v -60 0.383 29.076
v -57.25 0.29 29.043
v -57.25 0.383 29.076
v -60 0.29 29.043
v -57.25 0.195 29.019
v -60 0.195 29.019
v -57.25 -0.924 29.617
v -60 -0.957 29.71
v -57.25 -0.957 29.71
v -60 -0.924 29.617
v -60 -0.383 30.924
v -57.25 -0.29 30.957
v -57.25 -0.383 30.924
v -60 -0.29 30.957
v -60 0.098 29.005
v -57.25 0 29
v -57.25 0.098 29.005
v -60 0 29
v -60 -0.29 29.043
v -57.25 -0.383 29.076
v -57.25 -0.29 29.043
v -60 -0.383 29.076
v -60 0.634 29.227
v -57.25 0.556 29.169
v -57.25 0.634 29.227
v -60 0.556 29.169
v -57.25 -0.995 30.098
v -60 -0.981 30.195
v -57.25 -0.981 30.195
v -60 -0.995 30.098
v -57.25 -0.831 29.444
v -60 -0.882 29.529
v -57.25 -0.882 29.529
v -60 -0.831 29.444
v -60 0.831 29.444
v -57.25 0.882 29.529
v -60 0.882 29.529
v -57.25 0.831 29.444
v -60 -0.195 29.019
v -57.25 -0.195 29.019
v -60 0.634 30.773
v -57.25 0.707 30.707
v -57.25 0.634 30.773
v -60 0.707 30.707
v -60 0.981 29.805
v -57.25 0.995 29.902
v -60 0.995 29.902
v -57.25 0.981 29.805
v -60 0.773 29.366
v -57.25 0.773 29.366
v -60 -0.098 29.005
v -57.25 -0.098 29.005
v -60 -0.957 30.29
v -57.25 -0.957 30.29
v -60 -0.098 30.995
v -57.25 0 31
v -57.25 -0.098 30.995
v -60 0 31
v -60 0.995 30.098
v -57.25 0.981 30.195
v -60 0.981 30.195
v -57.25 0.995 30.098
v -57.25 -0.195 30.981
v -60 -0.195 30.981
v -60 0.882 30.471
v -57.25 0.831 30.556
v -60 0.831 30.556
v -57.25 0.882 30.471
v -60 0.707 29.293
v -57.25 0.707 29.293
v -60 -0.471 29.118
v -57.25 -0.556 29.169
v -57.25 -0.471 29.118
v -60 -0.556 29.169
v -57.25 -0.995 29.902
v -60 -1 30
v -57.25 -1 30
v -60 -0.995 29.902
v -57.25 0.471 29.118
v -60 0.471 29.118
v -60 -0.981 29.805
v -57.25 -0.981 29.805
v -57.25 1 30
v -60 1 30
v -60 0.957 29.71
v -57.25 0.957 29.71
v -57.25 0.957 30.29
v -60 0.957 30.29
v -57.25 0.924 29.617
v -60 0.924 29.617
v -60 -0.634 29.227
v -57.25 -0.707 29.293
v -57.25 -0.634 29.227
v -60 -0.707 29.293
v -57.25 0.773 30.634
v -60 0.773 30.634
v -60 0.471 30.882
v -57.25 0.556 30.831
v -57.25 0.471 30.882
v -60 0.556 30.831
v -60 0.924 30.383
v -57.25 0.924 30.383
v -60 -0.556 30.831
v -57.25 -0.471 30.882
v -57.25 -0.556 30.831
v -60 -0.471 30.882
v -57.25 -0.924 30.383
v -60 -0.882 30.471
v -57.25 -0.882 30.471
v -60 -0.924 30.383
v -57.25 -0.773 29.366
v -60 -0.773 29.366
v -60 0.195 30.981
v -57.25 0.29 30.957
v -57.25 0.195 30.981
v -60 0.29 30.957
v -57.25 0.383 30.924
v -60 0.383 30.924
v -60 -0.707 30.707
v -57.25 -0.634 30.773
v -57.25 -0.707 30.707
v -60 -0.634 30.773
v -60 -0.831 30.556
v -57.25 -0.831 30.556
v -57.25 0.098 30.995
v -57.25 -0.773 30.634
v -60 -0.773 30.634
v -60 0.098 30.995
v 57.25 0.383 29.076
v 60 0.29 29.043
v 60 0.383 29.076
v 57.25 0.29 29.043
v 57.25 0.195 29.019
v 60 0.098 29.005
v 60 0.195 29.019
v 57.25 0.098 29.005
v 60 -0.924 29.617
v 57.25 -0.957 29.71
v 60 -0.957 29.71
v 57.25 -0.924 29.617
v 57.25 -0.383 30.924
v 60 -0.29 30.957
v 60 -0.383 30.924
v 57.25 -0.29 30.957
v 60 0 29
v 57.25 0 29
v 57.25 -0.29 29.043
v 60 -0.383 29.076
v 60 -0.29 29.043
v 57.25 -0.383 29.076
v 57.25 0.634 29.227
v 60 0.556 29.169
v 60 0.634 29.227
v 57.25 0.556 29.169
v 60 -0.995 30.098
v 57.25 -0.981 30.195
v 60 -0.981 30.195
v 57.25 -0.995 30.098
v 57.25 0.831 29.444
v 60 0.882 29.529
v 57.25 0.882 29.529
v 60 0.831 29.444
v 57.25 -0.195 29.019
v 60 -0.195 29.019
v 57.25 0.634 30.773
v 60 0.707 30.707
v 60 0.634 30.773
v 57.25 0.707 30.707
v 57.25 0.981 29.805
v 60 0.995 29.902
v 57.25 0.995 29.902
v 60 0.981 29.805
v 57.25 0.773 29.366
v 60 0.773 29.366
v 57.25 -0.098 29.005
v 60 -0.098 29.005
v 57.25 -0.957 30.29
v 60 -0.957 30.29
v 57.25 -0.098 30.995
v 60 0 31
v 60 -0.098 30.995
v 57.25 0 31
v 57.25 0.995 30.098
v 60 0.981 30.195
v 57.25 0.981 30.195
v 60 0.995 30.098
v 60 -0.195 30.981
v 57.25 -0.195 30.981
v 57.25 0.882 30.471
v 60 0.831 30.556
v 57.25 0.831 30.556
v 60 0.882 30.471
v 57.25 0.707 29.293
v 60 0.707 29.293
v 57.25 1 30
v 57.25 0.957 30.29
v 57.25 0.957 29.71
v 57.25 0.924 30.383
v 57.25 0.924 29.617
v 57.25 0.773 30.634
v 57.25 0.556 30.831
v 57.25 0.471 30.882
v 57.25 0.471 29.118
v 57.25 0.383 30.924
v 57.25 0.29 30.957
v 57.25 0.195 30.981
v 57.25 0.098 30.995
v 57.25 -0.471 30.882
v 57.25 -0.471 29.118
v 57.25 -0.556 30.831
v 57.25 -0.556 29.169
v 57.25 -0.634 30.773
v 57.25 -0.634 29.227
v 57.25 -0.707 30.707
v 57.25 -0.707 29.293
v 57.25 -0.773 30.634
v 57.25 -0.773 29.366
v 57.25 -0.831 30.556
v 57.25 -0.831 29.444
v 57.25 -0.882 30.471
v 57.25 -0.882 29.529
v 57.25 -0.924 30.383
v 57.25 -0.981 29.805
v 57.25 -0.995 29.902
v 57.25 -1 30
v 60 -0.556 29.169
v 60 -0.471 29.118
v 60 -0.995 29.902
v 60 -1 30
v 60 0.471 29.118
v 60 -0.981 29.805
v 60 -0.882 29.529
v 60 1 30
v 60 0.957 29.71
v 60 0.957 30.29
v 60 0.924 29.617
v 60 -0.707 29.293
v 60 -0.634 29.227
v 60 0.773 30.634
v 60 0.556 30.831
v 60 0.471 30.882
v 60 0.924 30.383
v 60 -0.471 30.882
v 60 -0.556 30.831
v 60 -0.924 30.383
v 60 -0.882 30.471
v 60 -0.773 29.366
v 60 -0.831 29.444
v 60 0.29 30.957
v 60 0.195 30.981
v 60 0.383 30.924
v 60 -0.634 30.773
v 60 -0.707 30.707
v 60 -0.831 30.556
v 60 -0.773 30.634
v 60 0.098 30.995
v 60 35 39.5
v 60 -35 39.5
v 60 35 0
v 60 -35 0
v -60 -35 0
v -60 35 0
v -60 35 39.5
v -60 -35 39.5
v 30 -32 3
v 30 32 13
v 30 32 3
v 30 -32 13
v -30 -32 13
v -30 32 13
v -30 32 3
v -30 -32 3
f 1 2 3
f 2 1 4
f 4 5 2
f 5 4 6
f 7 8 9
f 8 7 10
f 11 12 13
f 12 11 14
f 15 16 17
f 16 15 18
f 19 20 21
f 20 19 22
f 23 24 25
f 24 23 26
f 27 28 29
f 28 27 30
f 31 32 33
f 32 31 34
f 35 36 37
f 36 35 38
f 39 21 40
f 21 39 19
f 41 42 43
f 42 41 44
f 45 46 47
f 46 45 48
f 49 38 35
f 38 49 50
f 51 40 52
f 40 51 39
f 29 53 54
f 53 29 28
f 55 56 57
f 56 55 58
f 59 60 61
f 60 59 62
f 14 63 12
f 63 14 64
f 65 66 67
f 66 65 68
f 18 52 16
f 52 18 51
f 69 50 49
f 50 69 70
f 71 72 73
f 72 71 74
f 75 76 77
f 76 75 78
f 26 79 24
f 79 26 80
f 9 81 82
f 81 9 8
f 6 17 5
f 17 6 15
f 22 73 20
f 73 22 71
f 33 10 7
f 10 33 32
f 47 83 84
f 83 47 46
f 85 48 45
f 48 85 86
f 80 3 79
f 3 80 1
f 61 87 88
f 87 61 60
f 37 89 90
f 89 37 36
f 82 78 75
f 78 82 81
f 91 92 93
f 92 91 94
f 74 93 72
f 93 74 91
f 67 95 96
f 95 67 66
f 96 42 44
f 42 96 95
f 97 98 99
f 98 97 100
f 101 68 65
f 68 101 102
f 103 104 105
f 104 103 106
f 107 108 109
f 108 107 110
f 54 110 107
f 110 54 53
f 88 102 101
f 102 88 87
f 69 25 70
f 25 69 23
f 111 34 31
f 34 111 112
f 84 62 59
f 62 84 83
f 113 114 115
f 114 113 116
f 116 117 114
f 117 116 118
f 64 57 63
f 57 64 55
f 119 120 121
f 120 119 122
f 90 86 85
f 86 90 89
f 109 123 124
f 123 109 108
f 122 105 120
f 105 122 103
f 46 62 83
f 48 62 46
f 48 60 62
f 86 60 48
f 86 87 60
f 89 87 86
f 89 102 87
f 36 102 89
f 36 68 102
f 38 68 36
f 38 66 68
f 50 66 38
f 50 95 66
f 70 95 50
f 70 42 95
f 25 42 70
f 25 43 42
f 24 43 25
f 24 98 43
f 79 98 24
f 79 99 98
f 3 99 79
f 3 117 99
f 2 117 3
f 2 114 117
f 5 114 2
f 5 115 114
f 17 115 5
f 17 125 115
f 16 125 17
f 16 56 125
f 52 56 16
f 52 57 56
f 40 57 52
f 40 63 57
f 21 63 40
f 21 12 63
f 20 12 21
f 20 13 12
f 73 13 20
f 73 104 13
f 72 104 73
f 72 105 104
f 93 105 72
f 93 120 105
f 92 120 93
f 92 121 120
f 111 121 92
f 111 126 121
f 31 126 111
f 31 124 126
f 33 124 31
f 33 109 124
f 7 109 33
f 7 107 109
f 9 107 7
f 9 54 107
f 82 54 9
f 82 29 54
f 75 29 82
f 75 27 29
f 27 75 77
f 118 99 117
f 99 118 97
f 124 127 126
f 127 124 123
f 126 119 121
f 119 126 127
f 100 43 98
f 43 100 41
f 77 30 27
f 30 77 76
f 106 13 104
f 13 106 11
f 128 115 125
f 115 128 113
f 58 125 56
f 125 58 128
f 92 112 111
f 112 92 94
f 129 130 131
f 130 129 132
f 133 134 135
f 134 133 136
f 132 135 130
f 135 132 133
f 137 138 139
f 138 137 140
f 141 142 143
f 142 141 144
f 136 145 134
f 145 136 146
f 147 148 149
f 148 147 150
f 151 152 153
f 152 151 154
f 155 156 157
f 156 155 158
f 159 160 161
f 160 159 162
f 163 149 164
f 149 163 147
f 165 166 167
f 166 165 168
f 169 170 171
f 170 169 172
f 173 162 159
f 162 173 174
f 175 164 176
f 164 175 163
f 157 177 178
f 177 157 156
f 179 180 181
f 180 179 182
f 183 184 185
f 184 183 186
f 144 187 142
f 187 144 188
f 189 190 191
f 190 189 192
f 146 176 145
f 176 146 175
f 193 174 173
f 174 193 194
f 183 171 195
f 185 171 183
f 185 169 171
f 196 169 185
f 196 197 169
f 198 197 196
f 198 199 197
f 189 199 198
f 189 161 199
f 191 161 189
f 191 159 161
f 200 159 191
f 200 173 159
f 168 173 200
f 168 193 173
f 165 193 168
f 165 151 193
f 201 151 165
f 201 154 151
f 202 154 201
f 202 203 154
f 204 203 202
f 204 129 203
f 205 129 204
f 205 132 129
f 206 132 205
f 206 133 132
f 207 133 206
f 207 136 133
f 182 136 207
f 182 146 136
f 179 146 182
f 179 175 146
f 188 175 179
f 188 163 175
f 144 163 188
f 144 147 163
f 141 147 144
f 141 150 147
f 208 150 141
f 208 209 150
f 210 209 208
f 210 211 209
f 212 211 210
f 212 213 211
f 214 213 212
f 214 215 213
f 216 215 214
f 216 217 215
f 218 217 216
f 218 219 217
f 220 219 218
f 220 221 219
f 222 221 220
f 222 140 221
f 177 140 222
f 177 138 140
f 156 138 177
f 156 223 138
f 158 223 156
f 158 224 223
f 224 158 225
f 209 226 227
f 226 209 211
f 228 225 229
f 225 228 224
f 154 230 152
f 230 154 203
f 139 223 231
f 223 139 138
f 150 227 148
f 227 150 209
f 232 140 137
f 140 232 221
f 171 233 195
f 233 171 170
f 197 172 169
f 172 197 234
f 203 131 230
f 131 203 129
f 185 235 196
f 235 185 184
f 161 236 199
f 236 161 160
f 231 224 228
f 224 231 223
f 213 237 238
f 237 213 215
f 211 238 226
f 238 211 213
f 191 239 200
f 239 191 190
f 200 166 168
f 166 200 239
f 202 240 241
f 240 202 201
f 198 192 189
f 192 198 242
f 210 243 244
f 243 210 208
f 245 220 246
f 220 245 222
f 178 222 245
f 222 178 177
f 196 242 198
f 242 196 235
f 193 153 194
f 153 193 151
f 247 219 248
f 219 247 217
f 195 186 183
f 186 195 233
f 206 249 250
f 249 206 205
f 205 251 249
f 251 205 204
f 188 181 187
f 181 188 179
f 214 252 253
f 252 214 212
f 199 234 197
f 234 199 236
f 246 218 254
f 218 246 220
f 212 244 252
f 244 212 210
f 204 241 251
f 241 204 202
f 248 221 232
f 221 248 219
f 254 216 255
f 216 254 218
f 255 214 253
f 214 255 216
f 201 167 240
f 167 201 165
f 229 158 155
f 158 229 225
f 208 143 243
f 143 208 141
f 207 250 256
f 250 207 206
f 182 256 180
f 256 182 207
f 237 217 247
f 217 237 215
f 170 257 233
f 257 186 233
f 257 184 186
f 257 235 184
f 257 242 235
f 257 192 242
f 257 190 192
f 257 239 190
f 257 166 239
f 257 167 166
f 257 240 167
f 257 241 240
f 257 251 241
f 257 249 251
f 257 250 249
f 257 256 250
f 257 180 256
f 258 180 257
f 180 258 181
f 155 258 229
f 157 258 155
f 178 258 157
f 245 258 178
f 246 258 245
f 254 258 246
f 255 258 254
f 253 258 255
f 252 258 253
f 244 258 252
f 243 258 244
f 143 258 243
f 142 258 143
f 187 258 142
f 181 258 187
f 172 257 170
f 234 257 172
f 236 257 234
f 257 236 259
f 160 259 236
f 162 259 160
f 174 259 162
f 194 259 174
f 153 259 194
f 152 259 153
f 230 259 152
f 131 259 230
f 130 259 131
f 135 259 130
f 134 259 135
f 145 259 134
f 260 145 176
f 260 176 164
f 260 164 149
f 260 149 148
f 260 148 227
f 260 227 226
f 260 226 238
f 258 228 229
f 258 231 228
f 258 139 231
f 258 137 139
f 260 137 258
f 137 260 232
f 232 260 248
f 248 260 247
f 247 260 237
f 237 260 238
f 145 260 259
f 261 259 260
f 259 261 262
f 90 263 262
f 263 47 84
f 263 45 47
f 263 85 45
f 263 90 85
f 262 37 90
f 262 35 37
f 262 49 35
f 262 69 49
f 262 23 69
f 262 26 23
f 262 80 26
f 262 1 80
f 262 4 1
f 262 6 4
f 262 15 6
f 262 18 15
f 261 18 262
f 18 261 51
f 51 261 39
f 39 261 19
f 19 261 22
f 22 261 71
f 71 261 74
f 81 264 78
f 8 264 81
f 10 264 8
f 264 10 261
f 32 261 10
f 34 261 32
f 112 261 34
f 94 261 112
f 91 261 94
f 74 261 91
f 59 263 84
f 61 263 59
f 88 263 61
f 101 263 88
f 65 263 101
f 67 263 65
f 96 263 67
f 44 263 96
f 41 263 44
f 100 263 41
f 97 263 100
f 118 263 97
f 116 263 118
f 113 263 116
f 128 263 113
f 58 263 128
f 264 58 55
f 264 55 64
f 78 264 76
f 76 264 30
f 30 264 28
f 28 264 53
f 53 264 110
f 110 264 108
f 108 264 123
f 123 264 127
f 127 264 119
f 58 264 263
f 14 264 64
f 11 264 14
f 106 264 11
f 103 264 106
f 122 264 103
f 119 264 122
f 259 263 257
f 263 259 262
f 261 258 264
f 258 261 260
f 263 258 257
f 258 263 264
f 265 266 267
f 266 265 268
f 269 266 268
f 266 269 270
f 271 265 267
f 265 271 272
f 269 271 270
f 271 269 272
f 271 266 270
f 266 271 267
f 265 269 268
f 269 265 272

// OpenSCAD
// Mini horizontal gel-electrophoresis box - buffer tank
// Print orientation: tank rests on XY plane, open top facing +Z

$fn = 64;

// ---- Tank ----
tank_x = 120;      // outer length (X)
tank_y = 70;       // outer width (Y)
tank_z = 40;       // outer height (Z)
wall   = 3;        // wall thickness
floor  = 3;        // floor thickness

// ---- Platform ----
plat_x = 60;       // platform length in X
plat_y = tank_y - 2*wall;  // platform spans full inner width (Y)
plat_top = 13;     // platform top height above tank bottom (z)

// ---- Electrode holes ----
hole_d = 2;        // horizontal hole diameter (along X)
hole_y = 0;        // hole centre Y
hole_z = 30;       // hole centre Z

// ---- Misc ----
eps = 0.5;         // cutter overshoot past faces

difference() {
    // Tank body
    translate([-tank_x/2, -tank_y/2, 0])
        cube([tank_x, tank_y, tank_z]);

    // Open top
    translate([-tank_x/2, -tank_y/2, tank_z - eps])
        cube([tank_x, tank_y, eps]);

    // Raised platform (solid, divides bottom into two chambers)
    translate([-tank_x/2 + (tank_x - plat_x)/2, -plat_y/2, floor])
        cube([plat_x, plat_y, plat_top - floor]);

    // Horizontal electrode holes through each end wall (along X)
    for (sx = [-1, 1])
        translate([sx * (tank_x/2 - hole_d/2), hole_y, hole_z])
            rotate([0, 90, 0])
                cylinder(d = hole_d, h = wall + eps, center = true);
}
